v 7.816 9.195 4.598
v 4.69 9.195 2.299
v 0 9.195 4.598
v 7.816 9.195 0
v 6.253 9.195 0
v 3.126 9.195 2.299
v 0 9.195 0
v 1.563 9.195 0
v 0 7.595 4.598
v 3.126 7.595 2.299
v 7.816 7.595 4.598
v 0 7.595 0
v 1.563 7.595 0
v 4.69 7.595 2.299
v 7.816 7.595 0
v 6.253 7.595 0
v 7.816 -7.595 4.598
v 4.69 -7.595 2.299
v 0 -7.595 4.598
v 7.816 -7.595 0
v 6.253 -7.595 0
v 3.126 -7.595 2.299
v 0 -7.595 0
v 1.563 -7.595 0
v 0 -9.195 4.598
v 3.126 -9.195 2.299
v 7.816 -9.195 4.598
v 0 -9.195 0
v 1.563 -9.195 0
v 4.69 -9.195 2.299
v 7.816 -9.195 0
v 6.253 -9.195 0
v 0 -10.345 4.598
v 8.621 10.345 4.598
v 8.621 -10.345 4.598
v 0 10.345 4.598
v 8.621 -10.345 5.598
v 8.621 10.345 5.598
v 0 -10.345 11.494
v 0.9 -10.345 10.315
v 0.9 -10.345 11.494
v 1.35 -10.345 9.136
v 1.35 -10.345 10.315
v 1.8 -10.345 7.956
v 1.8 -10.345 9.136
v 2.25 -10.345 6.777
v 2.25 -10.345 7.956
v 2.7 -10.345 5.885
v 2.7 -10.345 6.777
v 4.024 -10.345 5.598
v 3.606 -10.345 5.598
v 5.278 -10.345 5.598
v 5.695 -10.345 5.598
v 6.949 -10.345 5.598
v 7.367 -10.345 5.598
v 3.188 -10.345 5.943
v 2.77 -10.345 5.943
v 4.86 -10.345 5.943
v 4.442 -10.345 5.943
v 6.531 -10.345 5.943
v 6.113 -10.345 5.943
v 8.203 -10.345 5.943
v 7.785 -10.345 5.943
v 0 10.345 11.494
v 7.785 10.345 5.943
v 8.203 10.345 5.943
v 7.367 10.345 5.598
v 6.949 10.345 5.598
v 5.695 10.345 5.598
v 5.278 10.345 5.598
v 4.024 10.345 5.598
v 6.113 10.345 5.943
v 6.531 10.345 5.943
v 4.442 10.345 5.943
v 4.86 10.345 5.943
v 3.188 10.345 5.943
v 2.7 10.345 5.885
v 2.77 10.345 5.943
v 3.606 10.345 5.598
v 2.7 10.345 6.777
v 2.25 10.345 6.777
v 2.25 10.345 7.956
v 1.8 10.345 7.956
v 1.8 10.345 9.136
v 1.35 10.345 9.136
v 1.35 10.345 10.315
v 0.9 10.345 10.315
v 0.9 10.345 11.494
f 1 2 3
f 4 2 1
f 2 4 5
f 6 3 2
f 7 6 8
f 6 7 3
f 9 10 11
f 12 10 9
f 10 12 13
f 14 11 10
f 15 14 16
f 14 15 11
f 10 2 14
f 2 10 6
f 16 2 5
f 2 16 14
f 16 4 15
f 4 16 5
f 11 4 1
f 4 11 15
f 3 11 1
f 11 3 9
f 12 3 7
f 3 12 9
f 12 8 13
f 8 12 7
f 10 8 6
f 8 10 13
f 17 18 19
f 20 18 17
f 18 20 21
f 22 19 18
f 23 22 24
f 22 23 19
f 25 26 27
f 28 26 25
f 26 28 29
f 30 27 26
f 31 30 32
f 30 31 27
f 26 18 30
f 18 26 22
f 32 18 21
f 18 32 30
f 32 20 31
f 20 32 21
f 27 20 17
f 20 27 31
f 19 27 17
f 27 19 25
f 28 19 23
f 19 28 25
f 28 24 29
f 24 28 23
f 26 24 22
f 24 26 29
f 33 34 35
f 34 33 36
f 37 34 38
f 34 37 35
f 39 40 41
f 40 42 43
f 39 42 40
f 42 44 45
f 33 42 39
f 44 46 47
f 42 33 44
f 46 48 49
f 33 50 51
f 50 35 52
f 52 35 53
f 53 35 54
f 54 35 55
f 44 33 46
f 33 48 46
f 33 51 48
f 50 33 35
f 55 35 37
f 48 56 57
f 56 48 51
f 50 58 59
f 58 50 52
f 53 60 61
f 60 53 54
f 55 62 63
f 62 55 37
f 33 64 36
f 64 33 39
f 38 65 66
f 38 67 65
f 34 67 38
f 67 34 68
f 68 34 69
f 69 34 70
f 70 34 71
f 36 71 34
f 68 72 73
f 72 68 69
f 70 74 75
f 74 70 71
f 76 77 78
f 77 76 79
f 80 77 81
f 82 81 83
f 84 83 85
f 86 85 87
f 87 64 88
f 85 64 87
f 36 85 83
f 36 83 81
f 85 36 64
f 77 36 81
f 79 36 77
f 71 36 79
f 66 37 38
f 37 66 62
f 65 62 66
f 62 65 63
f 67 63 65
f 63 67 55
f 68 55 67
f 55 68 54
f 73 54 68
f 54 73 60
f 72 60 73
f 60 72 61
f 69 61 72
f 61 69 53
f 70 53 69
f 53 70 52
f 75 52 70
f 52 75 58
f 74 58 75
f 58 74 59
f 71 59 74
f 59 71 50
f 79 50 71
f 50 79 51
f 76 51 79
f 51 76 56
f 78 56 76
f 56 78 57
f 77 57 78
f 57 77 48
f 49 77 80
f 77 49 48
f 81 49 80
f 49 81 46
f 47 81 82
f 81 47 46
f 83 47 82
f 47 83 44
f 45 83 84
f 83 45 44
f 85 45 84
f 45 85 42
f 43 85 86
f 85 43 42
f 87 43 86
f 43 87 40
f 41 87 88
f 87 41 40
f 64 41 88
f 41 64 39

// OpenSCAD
// The part to be generated
part                      = "Bench"; // ["Bench", "Examples"]

/* [Bench] */

// Width of the bench (m)
bench_width               = 1.8;  // [0.50 : 0.05 : 5.00]

bench_corner_left         = 0;    // [-90 : 15 : 90]

bench_corner_right        = 0;    // [-90 : 15 : 90]

/* [Seat] */

// Type of seat
seat_type                 = "Planks"; // ["Flat", "Planks"]

// Depth of the seat (m)
seat_depth                = 0.75; // [0.50 : 0.05 : 2.00]

// Thickness of the seat (nozzle)
seat_thickness            = 2.5;  // [1.0 : 0.5 : 5.0]

// Number of planks
seat_plank_count          = 4;    // [1 : 10]

// Thickness of the plank (cm)
seat_plank_thickness      = 3;    // [0.0 : 0.1: 10.0]

/* [Back rest] */

// Type of back rest
backrest_type             = "Planks"; // ["None", "Flat", "Planks"]

// Heigh of the back rest (m)
backrest_height           = 0.60; // [0.50 : 0.05 : 1.0]

// Thickness of the back rest (layer)
backrest_thickness        = 6;    // [3 : 15]

// Number of planks
backrest_plank_count     = 5;     // [1 : 10]

// Thickness of the plank (layer)
backrest_plank_thickness = 3;     // [0 : 5]

/* [Arm rest] */

// Type of armrest
armrest_type              = "None"; // ["None", "Massive"]

// Number of armrests
armrest_count             = 2;    // [1 : 6]

// Distribution orientation
armrest_distr_orientation = "Center"; // ["Left", "Center", "Right"]

// Distribution pattern
armrest_distr_pattern     = "1";  // ["1":"Even", "12":"Short-Long"]

// Mirror distribution pattern
armrest_distr_pattern_mirror = false;

// Armrest side inset (m)
armrest_side_inset        = 0.0;  // [0.00 : 0.05 : 0.50]

// Length of armrest (m)
armrest_length            = 0.50; // [0.20 : 0.05 : 2.00]

// Height of armrest (m)
armrest_height            = 0.20; // [0.05 : 0.05 : 0.30]

// Width of armrest (nozzle)
armrest_width             = 2;    // [1.0 : 0.5 : 4.0]

/* [Support] */

// Number of legs
support_type              = "Legs"; // ["None", "Legs", "Massive"]

// Height of support (m)
support_height            = 0.40; // [0.10 : 0.05 : 1.00]

// Support front inset (m)
support_front_inset       = 0.07; // [0.00 : 0.01 : 0.10]

// Support side inset (m)  
support_side_inset        = 0.10; // [0.00 : 0.05 : 1.00]

// Number of legs
leg_count                 = 2;    // [1 : 6]

// Leg bridge height (m)
leg_bridge_height         = 0.2;   // [0.0 : 0.05 : 0.8]

// Leg thickness (nozzle)
leg_thickness             = 4;   // [2.0 : 0.5 : 10.0]

/* [Scale] */
scale_nominator           = 1;
scale_denominator         = 87;

/* [3D Printer] */

// Width of the 3D printer nozzle (mm)
nozzle_width              = 0.4; // [0.1 : 0.05 : 1.0]

// Layer height of the 3D printer (mm)
layer_height              = 0.15; // [0.06 : 0.01 : 0.2]

// First layer height of the 3D printer (mm)
first_layer_height        = 0.2; // [0.06 : 0.01 : 0.4]

/*********************************************************/

if      (part == "Bench")    Bench();
else if (part == "Examples") Examples();

module Bench(
    bench_width               = scaled( m( bench_width)),
    bench_corner_left         = angle(     bench_corner_left),
    bench_corner_right        = angle(     bench_corner_right),
    seat_type                 =            seat_type,
    seat_depth                = scaled( m( seat_depth)),
    seat_thickness            = nozzle(    seat_thickness),
    seat_plank_count          =            seat_plank_count,
    seat_plank_thickness      = scaled(cm( seat_plank_thickness)),
    backrest_type             =            backrest_type,
    backrest_height           = scaled( m( backrest_height)),
    backrest_thickness        = layer(     backrest_thickness),
    backrest_plank_count      =            backrest_plank_count,
    backrest_plank_thickness  = layer(     backrest_plank_thickness),
    armrest_type              =            armrest_type,
    armrest_count             =            armrest_count,
    armrest_distr_orientation =            armrest_distr_orientation,
    armrest_distr_pattern     =            armrest_distr_pattern,
    armrest_distr_pattern_mirror =         armrest_distr_pattern_mirror,
    armrest_side_inset        = scaled( m( armrest_side_inset)),
    armrest_length            = scaled( m( armrest_length)),
    armrest_height            = scaled( m( armrest_height)),
    armrest_width             = nozzle(    armrest_width),
    support_type              =            support_type,
    support_height            = scaled( m( support_height)),
    support_front_inset       = scaled( m( support_front_inset)),
    support_side_inset        = scaled( m( support_side_inset)),
    leg_count                 =            leg_count,
    leg_bridge_height         = scaled( m( leg_bridge_height)),
    leg_thickness             = nozzle(    leg_thickness),
) {
    Support() {
        SeatAndBackRest();
        ArmRests();
    }
    
    module Support() {
        if (support_type == "None") {
            children();
        } else {
            if      (support_type == "Legs"   ) Legs();
            else if (support_type == "Massive") Massive();
            else    assert(false, str(
                "'support_type' must be \"Legs\" or \"Massive\", but is ",
                support_type));
            translate([0, 0, support_height]) children();
        }
        
        leg_depth      = seat_depth - support_front_inset;
        
        module Legs() {
            most_left_leg  = (bench_width - leg_thickness) / 2
                           - support_side_inset
                           - tan(max(0, bench_corner_left / 2)) * leg_depth;
            most_right_leg = support_side_inset
                           - (bench_width - leg_thickness) / 2
                           + tan(max(0, bench_corner_right / 2)) * leg_depth;
            
            if (leg_count == 1) {
                Leg();
            } else {
                for (leg_index = [0 : leg_count - 1]) {
                    translate([
                        0,
                        between(most_left_leg, most_right_leg,
                            leg_index / (leg_count - 1)
                        )
                    ]) Leg();
                }
            }
            
            module Leg() {
                rotate(90, VEC_X) {
                    linear_extrude(leg_thickness, center = true) {
                        polygon([
                            [leg_depth * 0.0, support_height],
                            [leg_depth * 0.0, 0],
                            [leg_depth * 0.2, 0],
                            [leg_depth * 0.4, min(leg_bridge_height, support_height)],
                            [leg_depth * 0.6, min(leg_bridge_height, support_height)],
                            [leg_depth * 0.8, 0],
                            [leg_depth * 1.0, 0],
                            [leg_depth * 1.0, support_height]
                        ]);
                    }
                }
            }
        }
        
        module Massive() {
            linear_extrude(support_height) {
                polygon([
                    [
                        0,
                        bench_width / 2 - support_side_inset
                    ], [
                        leg_depth,
                        bench_width / 2 - support_side_inset
                        - tan(bench_corner_left / 2) * leg_depth
                    ], [
                        leg_depth,
                        - bench_width / 2 + support_side_inset
                        + tan(bench_corner_right / 2) * leg_depth
                    ], [
                        0,
                        - bench_width / 2 + support_side_inset
                    ]
                ]);
            }
            translate([0, -(bench_width - support_side_inset) / 2]) {
                
                *cube([
                    leg_depth,
                    (bench_width - support_side_inset),
                    support_height
                ]);
            }
        }
    }
    
    module SeatAndBackRest() {
        intersection() {
            linear_extrude(
                backrest_height,
                convexity = 2
            ) polygon([
                [0, -bench_width / 2],
                [seat_depth, -bench_width / 2 + tan(bench_corner_right / 2) * seat_depth],
                [seat_depth,  bench_width / 2 - tan(bench_corner_left  / 2) * seat_depth],
                [0, bench_width/ 2],
            ]);
            rotate(90, VEC_X) {
                linear_extrude(
                    bench_width + 2 * seat_depth,
                    center = true,
                    convexity = 10
                ) {
                    Seat2D();
                    BackRest2D();
                }
            }
        }
        
        module Seat2D() {
            if      (seat_type == "Flat")   Flat();
            else if (seat_type == "Planks") Planks();
            else assert(false, str(
                "'seat_type' should be \"Flat\" or \"Planks\" but is ",
                seat_type));
            
            module Flat() {
                square([seat_depth, seat_thickness]);
            }
            
            module Planks() {
                polygon(concat(
                    [
                        [0, 0],
                        [seat_depth, 0]
                    ],[
                        each for(plank_index = [0 : seat_plank_count - 1]) (
                            let(
                                x_from = plank_seam(plank_index + 0),
                                x_to   = plank_seam(plank_index + 1)
                            ) [
                                [
                                    between(x_from, x_to, 0.00),
                                    seat_thickness + 0,
                                ], [
                                    between(x_from, x_to, 0.25),
                                    seat_thickness + seat_plank_thickness
                                ], [
                                    between(x_from, x_to, 0.50),
                                    seat_thickness + seat_plank_thickness
                                ], [
                                    between(x_from, x_to, 0.75),
                                    seat_thickness + 0
                                ],
                            ]
                        )
                    ], (
                        (backrest_bottom_thickness != 0) ? [
                            [
                                0,
                                seat_thickness
                            ]
                        ] : [/* No points */]
                    )
                ));
                
                function plank_seam(i) = (
                    between(
                        seat_depth,
                        (backrest_bottom_thickness == 0) ? (
                            -seat_depth / (seat_plank_count * 4 - 1)
                        ) : (
                            backrest_bottom_thickness
                        ),
                        i / seat_plank_count
                    )
                );
            }
        }
        module BackRest2D() {
            if      (backrest_type == "Flat")    Flat();
            else if (backrest_type == "Planks") Planks();
            else assert(backrest_type == "None", "Unknown 'backrest_type'");
            
            module Flat() {
                square([backrest_thickness, backrest_height]);
            }
            
            module Planks() {
                polygon(concat(
                    [
                        [0, 0],
                        [0, backrest_height]
                    ], [
                        each for (plank_index = [0 : backrest_plank_count - 1]) let(
                            thickness = backrest_thickness
                                      + plank_index * backrest_plank_thickness
                        ) [[
                            thickness,
                            between(
                                backrest_height, seat_thickness,
                                plank_index / backrest_plank_count
                            )
                        ], [
                            thickness,
                            between(
                                backrest_height, seat_thickness,
                                (plank_index + 1) / backrest_plank_count
                            )
                        ]]
                    ]
                ));
            }
        }
    }
    
    module ArmRests() {
        if      (armrest_type == "Floating") Floating();
        else if (armrest_type == "Open")     Open();
        else if (armrest_type == "Massive")  Massive();
        else if (armrest_type == "Panel")    Panel();
        else assert(armrest_type == "None", "Unknown 'armrest_type'");
        
        length_from_back = armrest_length + backrest_thickness;
        
        module Floating() {
        }
        
        module Open() {
        }
        
        module Massive() {
            Distribute() {
                height = armrest_height + seat_thickness;
                translate([0, -armrest_width / 2]) {
                    cube([length_from_back, armrest_width, height]);
                }
            }
        }
        
        module Panel() {
        }
        
        module Distribute() {
            most_left_position  = (bench_width - armrest_width) / 2
                                - armrest_side_inset
                                - tan(max(0, bench_corner_left / 2)) * length_from_back;
            most_right_position = armrest_side_inset
                                - (bench_width - armrest_width) / 2
                                + tan(max(0, bench_corner_right / 2)) * length_from_back;
            outer_postions = (armrest_distr_orientation == "Left") ? [
                most_left_position,
                most_right_position
            ] : [
                most_right_position,
                most_left_position
            ];
            
            if (armrest_count == 1 && armrest_distr_orientation == "Center") {
                children();
            } else {
                is_pattern_centered = armrest_distr_orientation == "Center";
                count   = distr_pattern_get(armrest_count - (is_pattern_centered ? 1 : 0));
                
                for (index = [0:armrest_count - 1]) {
                    translate([
                        0,
                        between(
                            outer_postions[0],
                            outer_postions[1],
                            distr_pattern_get(index) / count
                        )
                    ]) children();
                    
                }
            }
            
            function distr_pattern_get(index) = (
                pattern_get(
                    reverse_if(
                        num_string_to_num_array(armrest_distr_pattern),
                        condition = armrest_distr_pattern_mirror
                    ),
                    index
                )
            );
        }
    }
    
    backrest_bottom_thickness = (
        (backrest_type == "None") ? (
            0
        ) : (backrest_type == "Planks") ? (
            backrest_thickness + (seat_plank_count - 1) * seat_plank_thickness 
        ) : (backrest_type == "Flat") ? (
            backrest_thickness
        ) : (
            assert(false) undef
        )
    );
};

module Examples() {
    Grid(columns = 5) {
        Bench(seat_type = "Flat",   backrest_type = "None", support_type = "Massive");
        Bench(seat_type = "Flat",   backrest_type = "Flat", support_type = "Massive");
        Bench(seat_type = "Flat",   backrest_type = "Flat", support_type = "Legs");
        Bench(seat_type = "Planks", backrest_type = "None", support_type = "Massive");
        Bench(seat_type = "Planks", backrest_type = "Planks", support_type = "Massive");
        Bench(seat_type = "Planks", backrest_type = "Planks", support_type = "Legs");
        Bench(seat_type = "Planks", backrest_type = "Planks", support_type = "None");
        Bench(seat_type = "Planks", backrest_type = "Flat", support_type = "Massive");
        Bench(seat_type = "Flat",   backrest_type = "Planks", support_type = "Legs");
        Bench(bench_corner_left =  45, bench_corner_right =  45);
        Bench(bench_corner_left = -90, bench_corner_right = -30);
        Bench(bench_corner_left = -45, bench_corner_right = 45);
        Bench(armrest_type = "Massive", armrest_count = 1,
              armrest_distr_orientation="Left");
        Bench(armrest_type = "Massive", armrest_count = 1,
              armrest_distr_orientation="Center");
        Bench(armrest_type = "Massive", armrest_count = 2);
        Bench(armrest_type = "Massive", armrest_count = 2,
              armrest_distr_orientation = "Left");
        Bench(armrest_type = "Massive", armrest_count = 2,
              armrest_distr_orientation = "Left", armrest_distr_pattern = "12");
        Bench(armrest_type = "Massive", armrest_count = 2,
              armrest_distr_orientation = "Left", armrest_distr_pattern = "12",
              armrest_distr_pattern_mirror = true);
        Bench(armrest_type = "Massive", armrest_count = 3,
              armrest_distr_pattern = "12",
              armrest_distr_pattern_mirror = true);
        Bench(armrest_type = "Massive", armrest_count = 3,
              armrest_distr_orientation = "Left", armrest_distr_pattern = "12",
              armrest_distr_pattern_mirror = true);
    }
    
    module Grid(columns) {
        rows  = ceil($children / columns);
        spacing  = [
            1.5 * scaled(m(bench_width)),
            max(2 * scaled(m(seat_depth)), 1.5 * scaled(m(bench_width)))
        ];
        for(column = [0 : columns - 1], row = [0:rows - 1]) {
            index = row * columns + column;
            if(index < $children) {
                translate([
                    spacing[0] * (column - (columns - 1) / 2),
                    -spacing[1] * (row    - (rows    - 1) / 2),
                ]) children(index);
            }
        }
    }
}

// Constants
VEC_X = [1, 0, 0];

// Units

function mm(x) = x;
function cm(x) = x * mm(10);
function  m(x) = x * mm(1000);

function angle(x) = x;

function layer(x, include_first_layer = false) = (
    include_first_layer ? (
        first_layer_height * max(1, x) +
        layer_height       * max(0, x - 1)
    ) : (
        layer_height       * x
    )
);

function nozzle(x) = x * mm(nozzle_width);

function scaled(x) = x * scale_nominator / scale_denominator;

// Helper functions

function between(a, b, f = 0.5) = (a * (1-f) + b * f);
assert(between(3, 7     ) == 5);
assert(between(3, 7, .25) == 4);

function num_string_to_num_array(string) = [
    for (c = string) ord(c) - ord("0")
];
assert(num_string_to_num_array("1234") == [1, 2, 3, 4]);

function sum(array, from_index=0, till_index=undef) = (
    (from_index < (is_num(till_index)?till_index:(len(array)))) ? (
        array[from_index] + sum(array, from_index + 1, till_index = till_index)
    ) : (
        0
    )
);
assert(sum([2, 3, 4, 5]                                ) == 14);
assert(sum([2, 3, 4, 5], from_index = 0, till_index = 4) == 14);
assert(sum([2, 3, 4, 5], from_index = 1                ) == 12);
assert(sum([2, 3, 4, 5],                 till_index = 3) ==  9);
assert(sum([2, 3, 4, 5], from_index = 1, till_index = 3) ==  7);

function reverse(array, condition = true) = (
    (condition) ? [
        for(i = [0 : len(array) - 1]) array[len(array) - i - 1]
    ] : (
        array
    )
);
assert(reverse([1, 2, 3]) == [3, 2, 1]);
        
function reverse_if(array, condition) = (
    (condition) ? reverse(array) : array
);
assert(reverse_if([1, 2, 3], condition=true)  == [3, 2, 1]);
assert(reverse_if([1, 2, 3], condition=false) == [1, 2, 3]);

function pattern_get(pattern, index) = (
    let(
        period  = sum(pattern)
    ) (
        period * floor(index / len(pattern))
        + sum(
            pattern, 
            till_index = index % len(pattern)
        )
    )
);
assert([for (i = [0 : 5]) pattern_get([1      ], i)], [0, 1, 2, 3, 4, 5]);
assert([for (i = [0 : 5]) pattern_get([1, 2   ], i)], [0, 1, 3, 4, 6, 7]);
assert([for (i = [0 : 5]) pattern_get([1, 3   ], i)], [0, 1, 4, 5, 8, 9]);
assert([for (i = [0 : 5]) pattern_get([1, 2, 3], i)], [0, 1, 3, 6, 7, 9]);
